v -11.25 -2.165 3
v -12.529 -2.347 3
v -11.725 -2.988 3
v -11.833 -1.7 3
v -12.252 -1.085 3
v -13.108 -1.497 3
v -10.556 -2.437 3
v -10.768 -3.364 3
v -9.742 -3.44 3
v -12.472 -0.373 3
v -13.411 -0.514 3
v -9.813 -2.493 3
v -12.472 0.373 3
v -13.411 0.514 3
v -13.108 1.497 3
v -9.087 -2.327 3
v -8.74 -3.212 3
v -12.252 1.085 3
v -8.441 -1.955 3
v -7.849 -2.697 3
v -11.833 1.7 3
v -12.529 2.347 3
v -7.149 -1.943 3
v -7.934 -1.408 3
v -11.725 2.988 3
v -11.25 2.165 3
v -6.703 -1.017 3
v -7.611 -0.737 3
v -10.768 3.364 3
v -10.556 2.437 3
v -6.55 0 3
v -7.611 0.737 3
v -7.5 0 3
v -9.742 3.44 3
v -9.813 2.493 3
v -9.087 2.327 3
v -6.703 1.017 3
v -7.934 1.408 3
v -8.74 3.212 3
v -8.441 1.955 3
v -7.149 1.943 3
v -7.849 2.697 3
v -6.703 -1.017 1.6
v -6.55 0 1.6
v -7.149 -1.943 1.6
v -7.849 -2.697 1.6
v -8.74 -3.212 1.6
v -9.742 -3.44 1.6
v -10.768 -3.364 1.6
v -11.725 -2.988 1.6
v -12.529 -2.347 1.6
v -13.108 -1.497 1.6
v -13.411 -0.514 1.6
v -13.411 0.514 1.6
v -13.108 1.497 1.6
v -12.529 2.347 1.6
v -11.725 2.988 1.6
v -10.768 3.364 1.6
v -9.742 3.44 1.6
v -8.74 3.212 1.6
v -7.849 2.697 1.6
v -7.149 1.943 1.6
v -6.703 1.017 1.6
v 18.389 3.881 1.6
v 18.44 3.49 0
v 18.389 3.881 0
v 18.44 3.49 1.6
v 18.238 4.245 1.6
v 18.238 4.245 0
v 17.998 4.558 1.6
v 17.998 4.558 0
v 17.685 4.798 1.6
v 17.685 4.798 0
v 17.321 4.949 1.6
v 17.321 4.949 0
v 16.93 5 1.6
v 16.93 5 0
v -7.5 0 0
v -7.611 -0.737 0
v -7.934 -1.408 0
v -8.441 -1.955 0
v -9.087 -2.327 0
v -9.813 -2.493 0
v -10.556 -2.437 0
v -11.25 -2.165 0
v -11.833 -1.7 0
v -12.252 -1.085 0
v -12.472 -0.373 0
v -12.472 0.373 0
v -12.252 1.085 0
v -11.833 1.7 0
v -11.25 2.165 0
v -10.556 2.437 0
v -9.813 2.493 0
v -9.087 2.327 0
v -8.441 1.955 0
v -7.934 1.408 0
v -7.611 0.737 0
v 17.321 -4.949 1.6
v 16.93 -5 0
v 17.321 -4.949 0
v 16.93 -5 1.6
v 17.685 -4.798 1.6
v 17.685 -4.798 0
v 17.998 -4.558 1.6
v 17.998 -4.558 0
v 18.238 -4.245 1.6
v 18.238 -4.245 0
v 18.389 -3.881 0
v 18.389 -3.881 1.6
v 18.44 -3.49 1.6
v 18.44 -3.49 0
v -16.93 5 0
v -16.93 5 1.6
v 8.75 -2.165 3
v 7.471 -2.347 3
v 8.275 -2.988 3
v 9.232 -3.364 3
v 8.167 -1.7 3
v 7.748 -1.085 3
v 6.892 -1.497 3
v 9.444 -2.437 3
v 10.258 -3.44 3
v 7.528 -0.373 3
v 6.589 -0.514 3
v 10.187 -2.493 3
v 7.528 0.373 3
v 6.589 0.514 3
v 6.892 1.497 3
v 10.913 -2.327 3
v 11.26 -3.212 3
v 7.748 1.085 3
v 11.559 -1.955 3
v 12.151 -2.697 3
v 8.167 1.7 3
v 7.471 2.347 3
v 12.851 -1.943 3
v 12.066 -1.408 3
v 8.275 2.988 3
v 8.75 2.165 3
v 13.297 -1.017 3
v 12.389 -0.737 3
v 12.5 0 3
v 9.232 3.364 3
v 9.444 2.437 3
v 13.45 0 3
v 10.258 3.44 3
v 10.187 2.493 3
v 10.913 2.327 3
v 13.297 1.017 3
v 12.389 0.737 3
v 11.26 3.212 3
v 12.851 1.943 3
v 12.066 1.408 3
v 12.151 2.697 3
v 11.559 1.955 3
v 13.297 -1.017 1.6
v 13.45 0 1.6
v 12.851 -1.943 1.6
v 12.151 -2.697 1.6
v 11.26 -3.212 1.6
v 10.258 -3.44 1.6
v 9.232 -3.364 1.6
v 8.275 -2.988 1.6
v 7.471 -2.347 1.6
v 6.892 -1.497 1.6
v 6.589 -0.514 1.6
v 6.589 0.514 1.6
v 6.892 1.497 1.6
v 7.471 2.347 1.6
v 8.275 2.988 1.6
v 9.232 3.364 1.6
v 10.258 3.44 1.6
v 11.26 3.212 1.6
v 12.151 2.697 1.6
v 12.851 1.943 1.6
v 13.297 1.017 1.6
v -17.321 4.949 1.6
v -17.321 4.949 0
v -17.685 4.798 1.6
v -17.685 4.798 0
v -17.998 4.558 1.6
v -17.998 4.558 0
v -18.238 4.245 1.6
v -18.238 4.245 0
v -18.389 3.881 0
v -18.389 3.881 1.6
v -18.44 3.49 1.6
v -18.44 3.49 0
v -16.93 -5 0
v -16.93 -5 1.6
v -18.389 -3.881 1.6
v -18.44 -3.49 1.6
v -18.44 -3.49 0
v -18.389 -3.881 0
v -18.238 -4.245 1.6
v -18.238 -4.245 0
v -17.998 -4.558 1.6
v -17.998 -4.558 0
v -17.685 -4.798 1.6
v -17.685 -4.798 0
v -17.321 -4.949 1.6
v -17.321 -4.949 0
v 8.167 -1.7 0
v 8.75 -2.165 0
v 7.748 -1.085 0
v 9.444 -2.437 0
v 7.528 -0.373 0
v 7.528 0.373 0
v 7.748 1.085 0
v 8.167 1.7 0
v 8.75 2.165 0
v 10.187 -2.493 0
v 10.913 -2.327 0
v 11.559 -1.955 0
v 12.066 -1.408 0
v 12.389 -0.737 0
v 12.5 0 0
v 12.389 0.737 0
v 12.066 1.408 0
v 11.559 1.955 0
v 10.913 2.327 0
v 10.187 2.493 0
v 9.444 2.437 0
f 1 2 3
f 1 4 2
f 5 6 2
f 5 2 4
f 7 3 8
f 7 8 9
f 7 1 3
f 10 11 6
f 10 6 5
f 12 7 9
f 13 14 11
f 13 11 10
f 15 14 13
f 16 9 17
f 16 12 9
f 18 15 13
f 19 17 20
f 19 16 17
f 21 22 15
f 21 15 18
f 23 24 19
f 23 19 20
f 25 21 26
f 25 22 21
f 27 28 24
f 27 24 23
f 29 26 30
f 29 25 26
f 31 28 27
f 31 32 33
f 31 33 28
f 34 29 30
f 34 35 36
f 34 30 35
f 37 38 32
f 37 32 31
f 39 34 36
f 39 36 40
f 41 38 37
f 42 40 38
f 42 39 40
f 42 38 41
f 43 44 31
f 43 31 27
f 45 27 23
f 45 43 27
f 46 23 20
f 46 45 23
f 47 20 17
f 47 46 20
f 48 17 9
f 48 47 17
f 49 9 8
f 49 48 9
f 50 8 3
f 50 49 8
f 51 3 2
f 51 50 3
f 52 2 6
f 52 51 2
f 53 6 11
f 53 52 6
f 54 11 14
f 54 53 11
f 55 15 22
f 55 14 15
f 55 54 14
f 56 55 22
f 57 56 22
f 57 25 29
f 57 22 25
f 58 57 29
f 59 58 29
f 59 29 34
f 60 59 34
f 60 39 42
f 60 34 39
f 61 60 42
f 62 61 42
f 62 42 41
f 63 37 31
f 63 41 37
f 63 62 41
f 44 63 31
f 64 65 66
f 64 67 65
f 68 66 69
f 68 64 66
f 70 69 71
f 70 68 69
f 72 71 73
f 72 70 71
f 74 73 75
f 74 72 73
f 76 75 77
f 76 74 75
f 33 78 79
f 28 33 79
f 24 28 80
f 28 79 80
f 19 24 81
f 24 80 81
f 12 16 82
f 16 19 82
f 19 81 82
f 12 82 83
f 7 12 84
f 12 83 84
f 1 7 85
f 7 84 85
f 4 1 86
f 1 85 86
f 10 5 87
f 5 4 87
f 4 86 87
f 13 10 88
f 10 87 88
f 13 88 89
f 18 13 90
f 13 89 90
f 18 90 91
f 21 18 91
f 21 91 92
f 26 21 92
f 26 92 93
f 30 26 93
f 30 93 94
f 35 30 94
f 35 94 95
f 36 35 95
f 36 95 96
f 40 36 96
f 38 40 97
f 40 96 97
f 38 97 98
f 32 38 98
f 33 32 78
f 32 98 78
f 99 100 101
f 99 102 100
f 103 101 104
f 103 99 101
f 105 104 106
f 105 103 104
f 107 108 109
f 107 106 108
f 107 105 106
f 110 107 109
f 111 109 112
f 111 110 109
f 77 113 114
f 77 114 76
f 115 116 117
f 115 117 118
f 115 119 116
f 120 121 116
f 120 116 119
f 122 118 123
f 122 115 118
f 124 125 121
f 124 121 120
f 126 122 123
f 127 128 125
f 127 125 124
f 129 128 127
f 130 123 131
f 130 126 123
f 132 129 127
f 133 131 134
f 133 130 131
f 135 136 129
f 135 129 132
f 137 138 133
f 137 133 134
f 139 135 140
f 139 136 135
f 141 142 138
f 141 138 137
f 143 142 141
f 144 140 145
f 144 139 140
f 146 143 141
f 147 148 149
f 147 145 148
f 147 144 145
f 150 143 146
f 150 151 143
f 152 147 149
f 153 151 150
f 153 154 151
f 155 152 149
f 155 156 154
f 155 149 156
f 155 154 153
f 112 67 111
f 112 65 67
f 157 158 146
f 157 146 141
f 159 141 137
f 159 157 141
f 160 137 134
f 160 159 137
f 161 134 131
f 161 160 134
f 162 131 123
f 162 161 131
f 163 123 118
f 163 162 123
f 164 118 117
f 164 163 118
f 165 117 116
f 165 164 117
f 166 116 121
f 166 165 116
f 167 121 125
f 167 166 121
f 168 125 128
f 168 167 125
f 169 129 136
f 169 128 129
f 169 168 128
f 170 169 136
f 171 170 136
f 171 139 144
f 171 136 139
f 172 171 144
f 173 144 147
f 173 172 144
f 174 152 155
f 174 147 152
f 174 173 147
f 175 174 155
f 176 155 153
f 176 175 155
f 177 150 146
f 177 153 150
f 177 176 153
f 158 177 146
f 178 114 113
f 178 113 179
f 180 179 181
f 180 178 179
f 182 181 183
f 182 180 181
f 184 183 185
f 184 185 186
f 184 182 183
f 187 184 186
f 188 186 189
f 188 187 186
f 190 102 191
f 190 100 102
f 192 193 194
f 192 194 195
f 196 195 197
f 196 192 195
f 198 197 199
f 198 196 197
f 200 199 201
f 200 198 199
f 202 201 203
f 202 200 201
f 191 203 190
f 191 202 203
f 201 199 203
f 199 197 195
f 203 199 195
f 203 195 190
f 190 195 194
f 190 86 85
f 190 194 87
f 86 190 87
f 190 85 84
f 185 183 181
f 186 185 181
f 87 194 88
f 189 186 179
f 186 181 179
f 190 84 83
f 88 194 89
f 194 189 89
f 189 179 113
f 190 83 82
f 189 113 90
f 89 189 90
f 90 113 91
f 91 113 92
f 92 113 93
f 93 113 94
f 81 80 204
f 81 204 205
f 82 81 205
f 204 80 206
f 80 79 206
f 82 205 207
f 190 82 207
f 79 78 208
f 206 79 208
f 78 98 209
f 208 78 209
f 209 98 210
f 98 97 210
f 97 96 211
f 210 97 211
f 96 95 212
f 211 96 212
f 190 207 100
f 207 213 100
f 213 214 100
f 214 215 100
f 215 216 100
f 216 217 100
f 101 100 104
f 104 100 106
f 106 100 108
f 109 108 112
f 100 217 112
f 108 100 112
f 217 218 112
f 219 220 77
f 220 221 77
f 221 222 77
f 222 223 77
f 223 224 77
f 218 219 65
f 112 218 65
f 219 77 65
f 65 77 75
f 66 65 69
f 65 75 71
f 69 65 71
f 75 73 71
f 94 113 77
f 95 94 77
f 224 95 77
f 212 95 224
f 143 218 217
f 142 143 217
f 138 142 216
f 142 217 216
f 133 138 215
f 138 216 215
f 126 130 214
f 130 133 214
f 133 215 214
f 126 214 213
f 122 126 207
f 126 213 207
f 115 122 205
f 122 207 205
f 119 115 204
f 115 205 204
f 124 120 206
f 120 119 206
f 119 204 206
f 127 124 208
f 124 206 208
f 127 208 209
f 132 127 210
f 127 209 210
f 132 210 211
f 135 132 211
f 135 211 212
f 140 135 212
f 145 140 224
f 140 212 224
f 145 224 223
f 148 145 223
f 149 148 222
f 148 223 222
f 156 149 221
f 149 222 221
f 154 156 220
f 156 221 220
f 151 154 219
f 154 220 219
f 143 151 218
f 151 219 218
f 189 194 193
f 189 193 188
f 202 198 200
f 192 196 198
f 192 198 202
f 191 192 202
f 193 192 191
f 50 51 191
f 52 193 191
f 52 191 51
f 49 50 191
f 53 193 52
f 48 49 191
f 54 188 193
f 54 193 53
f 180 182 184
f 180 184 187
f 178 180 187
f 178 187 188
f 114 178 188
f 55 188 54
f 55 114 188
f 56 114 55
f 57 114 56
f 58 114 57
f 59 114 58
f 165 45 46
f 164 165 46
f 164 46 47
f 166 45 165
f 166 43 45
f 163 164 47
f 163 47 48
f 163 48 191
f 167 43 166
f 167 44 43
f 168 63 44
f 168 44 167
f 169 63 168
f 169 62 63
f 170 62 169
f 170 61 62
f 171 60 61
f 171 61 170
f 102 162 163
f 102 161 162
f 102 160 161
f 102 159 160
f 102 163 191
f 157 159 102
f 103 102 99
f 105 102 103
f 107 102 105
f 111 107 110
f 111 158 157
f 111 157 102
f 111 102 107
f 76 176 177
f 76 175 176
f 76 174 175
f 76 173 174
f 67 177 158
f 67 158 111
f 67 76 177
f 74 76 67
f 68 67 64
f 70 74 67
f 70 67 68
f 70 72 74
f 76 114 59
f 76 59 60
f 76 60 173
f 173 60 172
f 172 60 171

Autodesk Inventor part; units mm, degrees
ref_plane "YZ Plane" through (0, 0, 0) normal (1, 0, 0) x (0, 1, 0)
ref_plane "XZ Plane" through (0, 0, 0) normal (0, 1, 0) x (-1, 0, 0)
ref_plane "XY Plane" through (0, 0, 0) normal (0, 0, 1) x (1, 0, 0)
sketch "Sketch1" plane through (0, 0, 0) normal (0, 0, 1) x (1, 0, 0)
  line L0 (-18.44, 5) -> (18.44, 5)
  line L1 (18.44, 5) -> (18.44, -5)
  line L2 (18.44, -5) -> (-18.44, -5)
  line L3 (-18.44, -5) -> (-18.44, 5)
  line L4 (0, 5) -> (0, -5) construction
  line L5 (-18.44, 0) -> (18.44, 0) construction
  circle A0 centre (-10, 0) radius 2.5
  circle A1 centre (10, 0) radius 2.5
  point P0 (0, 0)
  dimension "d0" = 10
  dimension "d1" = 36.88
  dimension "d2" = 5
  dimension "d3" = 20
extrude "Extrusion1" add sketch "Sketch1" along normal blind 1.6
sketch "Sketch2" plane through (0, 0, 1.6) normal (0, 0, 1) x (1, 0, 0)
  circle A0 centre (10, 0) radius 2.5 projected
  circle A1 centre (-10, 0) radius 2.5 projected
  circle A2 centre (-10, 0) radius 3.45
  circle A3 centre (10, 0) radius 3.45
  point P0 (0, 0)
  dimension "d6" = 6.9
  dimension "d7" = 6.9
extrude "Extrusion2" add sketch "Sketch2" along normal blind 1.4
thread "Thread1" size "M5x0.8" class "6H" standard "ANSI Metric M Profile" full length
thread "Thread2" size "M5x0.8" class "6H" standard "ANSI Metric M Profile" full length
fillet "Fillet1" radius 1.51 4 edges at (18.44, 5, 0.8) (18.44, -5, 0.8) (-18.44, -5, 0.8) (-18.44, 5, 0.8)
properties part number "doube t-nut"
